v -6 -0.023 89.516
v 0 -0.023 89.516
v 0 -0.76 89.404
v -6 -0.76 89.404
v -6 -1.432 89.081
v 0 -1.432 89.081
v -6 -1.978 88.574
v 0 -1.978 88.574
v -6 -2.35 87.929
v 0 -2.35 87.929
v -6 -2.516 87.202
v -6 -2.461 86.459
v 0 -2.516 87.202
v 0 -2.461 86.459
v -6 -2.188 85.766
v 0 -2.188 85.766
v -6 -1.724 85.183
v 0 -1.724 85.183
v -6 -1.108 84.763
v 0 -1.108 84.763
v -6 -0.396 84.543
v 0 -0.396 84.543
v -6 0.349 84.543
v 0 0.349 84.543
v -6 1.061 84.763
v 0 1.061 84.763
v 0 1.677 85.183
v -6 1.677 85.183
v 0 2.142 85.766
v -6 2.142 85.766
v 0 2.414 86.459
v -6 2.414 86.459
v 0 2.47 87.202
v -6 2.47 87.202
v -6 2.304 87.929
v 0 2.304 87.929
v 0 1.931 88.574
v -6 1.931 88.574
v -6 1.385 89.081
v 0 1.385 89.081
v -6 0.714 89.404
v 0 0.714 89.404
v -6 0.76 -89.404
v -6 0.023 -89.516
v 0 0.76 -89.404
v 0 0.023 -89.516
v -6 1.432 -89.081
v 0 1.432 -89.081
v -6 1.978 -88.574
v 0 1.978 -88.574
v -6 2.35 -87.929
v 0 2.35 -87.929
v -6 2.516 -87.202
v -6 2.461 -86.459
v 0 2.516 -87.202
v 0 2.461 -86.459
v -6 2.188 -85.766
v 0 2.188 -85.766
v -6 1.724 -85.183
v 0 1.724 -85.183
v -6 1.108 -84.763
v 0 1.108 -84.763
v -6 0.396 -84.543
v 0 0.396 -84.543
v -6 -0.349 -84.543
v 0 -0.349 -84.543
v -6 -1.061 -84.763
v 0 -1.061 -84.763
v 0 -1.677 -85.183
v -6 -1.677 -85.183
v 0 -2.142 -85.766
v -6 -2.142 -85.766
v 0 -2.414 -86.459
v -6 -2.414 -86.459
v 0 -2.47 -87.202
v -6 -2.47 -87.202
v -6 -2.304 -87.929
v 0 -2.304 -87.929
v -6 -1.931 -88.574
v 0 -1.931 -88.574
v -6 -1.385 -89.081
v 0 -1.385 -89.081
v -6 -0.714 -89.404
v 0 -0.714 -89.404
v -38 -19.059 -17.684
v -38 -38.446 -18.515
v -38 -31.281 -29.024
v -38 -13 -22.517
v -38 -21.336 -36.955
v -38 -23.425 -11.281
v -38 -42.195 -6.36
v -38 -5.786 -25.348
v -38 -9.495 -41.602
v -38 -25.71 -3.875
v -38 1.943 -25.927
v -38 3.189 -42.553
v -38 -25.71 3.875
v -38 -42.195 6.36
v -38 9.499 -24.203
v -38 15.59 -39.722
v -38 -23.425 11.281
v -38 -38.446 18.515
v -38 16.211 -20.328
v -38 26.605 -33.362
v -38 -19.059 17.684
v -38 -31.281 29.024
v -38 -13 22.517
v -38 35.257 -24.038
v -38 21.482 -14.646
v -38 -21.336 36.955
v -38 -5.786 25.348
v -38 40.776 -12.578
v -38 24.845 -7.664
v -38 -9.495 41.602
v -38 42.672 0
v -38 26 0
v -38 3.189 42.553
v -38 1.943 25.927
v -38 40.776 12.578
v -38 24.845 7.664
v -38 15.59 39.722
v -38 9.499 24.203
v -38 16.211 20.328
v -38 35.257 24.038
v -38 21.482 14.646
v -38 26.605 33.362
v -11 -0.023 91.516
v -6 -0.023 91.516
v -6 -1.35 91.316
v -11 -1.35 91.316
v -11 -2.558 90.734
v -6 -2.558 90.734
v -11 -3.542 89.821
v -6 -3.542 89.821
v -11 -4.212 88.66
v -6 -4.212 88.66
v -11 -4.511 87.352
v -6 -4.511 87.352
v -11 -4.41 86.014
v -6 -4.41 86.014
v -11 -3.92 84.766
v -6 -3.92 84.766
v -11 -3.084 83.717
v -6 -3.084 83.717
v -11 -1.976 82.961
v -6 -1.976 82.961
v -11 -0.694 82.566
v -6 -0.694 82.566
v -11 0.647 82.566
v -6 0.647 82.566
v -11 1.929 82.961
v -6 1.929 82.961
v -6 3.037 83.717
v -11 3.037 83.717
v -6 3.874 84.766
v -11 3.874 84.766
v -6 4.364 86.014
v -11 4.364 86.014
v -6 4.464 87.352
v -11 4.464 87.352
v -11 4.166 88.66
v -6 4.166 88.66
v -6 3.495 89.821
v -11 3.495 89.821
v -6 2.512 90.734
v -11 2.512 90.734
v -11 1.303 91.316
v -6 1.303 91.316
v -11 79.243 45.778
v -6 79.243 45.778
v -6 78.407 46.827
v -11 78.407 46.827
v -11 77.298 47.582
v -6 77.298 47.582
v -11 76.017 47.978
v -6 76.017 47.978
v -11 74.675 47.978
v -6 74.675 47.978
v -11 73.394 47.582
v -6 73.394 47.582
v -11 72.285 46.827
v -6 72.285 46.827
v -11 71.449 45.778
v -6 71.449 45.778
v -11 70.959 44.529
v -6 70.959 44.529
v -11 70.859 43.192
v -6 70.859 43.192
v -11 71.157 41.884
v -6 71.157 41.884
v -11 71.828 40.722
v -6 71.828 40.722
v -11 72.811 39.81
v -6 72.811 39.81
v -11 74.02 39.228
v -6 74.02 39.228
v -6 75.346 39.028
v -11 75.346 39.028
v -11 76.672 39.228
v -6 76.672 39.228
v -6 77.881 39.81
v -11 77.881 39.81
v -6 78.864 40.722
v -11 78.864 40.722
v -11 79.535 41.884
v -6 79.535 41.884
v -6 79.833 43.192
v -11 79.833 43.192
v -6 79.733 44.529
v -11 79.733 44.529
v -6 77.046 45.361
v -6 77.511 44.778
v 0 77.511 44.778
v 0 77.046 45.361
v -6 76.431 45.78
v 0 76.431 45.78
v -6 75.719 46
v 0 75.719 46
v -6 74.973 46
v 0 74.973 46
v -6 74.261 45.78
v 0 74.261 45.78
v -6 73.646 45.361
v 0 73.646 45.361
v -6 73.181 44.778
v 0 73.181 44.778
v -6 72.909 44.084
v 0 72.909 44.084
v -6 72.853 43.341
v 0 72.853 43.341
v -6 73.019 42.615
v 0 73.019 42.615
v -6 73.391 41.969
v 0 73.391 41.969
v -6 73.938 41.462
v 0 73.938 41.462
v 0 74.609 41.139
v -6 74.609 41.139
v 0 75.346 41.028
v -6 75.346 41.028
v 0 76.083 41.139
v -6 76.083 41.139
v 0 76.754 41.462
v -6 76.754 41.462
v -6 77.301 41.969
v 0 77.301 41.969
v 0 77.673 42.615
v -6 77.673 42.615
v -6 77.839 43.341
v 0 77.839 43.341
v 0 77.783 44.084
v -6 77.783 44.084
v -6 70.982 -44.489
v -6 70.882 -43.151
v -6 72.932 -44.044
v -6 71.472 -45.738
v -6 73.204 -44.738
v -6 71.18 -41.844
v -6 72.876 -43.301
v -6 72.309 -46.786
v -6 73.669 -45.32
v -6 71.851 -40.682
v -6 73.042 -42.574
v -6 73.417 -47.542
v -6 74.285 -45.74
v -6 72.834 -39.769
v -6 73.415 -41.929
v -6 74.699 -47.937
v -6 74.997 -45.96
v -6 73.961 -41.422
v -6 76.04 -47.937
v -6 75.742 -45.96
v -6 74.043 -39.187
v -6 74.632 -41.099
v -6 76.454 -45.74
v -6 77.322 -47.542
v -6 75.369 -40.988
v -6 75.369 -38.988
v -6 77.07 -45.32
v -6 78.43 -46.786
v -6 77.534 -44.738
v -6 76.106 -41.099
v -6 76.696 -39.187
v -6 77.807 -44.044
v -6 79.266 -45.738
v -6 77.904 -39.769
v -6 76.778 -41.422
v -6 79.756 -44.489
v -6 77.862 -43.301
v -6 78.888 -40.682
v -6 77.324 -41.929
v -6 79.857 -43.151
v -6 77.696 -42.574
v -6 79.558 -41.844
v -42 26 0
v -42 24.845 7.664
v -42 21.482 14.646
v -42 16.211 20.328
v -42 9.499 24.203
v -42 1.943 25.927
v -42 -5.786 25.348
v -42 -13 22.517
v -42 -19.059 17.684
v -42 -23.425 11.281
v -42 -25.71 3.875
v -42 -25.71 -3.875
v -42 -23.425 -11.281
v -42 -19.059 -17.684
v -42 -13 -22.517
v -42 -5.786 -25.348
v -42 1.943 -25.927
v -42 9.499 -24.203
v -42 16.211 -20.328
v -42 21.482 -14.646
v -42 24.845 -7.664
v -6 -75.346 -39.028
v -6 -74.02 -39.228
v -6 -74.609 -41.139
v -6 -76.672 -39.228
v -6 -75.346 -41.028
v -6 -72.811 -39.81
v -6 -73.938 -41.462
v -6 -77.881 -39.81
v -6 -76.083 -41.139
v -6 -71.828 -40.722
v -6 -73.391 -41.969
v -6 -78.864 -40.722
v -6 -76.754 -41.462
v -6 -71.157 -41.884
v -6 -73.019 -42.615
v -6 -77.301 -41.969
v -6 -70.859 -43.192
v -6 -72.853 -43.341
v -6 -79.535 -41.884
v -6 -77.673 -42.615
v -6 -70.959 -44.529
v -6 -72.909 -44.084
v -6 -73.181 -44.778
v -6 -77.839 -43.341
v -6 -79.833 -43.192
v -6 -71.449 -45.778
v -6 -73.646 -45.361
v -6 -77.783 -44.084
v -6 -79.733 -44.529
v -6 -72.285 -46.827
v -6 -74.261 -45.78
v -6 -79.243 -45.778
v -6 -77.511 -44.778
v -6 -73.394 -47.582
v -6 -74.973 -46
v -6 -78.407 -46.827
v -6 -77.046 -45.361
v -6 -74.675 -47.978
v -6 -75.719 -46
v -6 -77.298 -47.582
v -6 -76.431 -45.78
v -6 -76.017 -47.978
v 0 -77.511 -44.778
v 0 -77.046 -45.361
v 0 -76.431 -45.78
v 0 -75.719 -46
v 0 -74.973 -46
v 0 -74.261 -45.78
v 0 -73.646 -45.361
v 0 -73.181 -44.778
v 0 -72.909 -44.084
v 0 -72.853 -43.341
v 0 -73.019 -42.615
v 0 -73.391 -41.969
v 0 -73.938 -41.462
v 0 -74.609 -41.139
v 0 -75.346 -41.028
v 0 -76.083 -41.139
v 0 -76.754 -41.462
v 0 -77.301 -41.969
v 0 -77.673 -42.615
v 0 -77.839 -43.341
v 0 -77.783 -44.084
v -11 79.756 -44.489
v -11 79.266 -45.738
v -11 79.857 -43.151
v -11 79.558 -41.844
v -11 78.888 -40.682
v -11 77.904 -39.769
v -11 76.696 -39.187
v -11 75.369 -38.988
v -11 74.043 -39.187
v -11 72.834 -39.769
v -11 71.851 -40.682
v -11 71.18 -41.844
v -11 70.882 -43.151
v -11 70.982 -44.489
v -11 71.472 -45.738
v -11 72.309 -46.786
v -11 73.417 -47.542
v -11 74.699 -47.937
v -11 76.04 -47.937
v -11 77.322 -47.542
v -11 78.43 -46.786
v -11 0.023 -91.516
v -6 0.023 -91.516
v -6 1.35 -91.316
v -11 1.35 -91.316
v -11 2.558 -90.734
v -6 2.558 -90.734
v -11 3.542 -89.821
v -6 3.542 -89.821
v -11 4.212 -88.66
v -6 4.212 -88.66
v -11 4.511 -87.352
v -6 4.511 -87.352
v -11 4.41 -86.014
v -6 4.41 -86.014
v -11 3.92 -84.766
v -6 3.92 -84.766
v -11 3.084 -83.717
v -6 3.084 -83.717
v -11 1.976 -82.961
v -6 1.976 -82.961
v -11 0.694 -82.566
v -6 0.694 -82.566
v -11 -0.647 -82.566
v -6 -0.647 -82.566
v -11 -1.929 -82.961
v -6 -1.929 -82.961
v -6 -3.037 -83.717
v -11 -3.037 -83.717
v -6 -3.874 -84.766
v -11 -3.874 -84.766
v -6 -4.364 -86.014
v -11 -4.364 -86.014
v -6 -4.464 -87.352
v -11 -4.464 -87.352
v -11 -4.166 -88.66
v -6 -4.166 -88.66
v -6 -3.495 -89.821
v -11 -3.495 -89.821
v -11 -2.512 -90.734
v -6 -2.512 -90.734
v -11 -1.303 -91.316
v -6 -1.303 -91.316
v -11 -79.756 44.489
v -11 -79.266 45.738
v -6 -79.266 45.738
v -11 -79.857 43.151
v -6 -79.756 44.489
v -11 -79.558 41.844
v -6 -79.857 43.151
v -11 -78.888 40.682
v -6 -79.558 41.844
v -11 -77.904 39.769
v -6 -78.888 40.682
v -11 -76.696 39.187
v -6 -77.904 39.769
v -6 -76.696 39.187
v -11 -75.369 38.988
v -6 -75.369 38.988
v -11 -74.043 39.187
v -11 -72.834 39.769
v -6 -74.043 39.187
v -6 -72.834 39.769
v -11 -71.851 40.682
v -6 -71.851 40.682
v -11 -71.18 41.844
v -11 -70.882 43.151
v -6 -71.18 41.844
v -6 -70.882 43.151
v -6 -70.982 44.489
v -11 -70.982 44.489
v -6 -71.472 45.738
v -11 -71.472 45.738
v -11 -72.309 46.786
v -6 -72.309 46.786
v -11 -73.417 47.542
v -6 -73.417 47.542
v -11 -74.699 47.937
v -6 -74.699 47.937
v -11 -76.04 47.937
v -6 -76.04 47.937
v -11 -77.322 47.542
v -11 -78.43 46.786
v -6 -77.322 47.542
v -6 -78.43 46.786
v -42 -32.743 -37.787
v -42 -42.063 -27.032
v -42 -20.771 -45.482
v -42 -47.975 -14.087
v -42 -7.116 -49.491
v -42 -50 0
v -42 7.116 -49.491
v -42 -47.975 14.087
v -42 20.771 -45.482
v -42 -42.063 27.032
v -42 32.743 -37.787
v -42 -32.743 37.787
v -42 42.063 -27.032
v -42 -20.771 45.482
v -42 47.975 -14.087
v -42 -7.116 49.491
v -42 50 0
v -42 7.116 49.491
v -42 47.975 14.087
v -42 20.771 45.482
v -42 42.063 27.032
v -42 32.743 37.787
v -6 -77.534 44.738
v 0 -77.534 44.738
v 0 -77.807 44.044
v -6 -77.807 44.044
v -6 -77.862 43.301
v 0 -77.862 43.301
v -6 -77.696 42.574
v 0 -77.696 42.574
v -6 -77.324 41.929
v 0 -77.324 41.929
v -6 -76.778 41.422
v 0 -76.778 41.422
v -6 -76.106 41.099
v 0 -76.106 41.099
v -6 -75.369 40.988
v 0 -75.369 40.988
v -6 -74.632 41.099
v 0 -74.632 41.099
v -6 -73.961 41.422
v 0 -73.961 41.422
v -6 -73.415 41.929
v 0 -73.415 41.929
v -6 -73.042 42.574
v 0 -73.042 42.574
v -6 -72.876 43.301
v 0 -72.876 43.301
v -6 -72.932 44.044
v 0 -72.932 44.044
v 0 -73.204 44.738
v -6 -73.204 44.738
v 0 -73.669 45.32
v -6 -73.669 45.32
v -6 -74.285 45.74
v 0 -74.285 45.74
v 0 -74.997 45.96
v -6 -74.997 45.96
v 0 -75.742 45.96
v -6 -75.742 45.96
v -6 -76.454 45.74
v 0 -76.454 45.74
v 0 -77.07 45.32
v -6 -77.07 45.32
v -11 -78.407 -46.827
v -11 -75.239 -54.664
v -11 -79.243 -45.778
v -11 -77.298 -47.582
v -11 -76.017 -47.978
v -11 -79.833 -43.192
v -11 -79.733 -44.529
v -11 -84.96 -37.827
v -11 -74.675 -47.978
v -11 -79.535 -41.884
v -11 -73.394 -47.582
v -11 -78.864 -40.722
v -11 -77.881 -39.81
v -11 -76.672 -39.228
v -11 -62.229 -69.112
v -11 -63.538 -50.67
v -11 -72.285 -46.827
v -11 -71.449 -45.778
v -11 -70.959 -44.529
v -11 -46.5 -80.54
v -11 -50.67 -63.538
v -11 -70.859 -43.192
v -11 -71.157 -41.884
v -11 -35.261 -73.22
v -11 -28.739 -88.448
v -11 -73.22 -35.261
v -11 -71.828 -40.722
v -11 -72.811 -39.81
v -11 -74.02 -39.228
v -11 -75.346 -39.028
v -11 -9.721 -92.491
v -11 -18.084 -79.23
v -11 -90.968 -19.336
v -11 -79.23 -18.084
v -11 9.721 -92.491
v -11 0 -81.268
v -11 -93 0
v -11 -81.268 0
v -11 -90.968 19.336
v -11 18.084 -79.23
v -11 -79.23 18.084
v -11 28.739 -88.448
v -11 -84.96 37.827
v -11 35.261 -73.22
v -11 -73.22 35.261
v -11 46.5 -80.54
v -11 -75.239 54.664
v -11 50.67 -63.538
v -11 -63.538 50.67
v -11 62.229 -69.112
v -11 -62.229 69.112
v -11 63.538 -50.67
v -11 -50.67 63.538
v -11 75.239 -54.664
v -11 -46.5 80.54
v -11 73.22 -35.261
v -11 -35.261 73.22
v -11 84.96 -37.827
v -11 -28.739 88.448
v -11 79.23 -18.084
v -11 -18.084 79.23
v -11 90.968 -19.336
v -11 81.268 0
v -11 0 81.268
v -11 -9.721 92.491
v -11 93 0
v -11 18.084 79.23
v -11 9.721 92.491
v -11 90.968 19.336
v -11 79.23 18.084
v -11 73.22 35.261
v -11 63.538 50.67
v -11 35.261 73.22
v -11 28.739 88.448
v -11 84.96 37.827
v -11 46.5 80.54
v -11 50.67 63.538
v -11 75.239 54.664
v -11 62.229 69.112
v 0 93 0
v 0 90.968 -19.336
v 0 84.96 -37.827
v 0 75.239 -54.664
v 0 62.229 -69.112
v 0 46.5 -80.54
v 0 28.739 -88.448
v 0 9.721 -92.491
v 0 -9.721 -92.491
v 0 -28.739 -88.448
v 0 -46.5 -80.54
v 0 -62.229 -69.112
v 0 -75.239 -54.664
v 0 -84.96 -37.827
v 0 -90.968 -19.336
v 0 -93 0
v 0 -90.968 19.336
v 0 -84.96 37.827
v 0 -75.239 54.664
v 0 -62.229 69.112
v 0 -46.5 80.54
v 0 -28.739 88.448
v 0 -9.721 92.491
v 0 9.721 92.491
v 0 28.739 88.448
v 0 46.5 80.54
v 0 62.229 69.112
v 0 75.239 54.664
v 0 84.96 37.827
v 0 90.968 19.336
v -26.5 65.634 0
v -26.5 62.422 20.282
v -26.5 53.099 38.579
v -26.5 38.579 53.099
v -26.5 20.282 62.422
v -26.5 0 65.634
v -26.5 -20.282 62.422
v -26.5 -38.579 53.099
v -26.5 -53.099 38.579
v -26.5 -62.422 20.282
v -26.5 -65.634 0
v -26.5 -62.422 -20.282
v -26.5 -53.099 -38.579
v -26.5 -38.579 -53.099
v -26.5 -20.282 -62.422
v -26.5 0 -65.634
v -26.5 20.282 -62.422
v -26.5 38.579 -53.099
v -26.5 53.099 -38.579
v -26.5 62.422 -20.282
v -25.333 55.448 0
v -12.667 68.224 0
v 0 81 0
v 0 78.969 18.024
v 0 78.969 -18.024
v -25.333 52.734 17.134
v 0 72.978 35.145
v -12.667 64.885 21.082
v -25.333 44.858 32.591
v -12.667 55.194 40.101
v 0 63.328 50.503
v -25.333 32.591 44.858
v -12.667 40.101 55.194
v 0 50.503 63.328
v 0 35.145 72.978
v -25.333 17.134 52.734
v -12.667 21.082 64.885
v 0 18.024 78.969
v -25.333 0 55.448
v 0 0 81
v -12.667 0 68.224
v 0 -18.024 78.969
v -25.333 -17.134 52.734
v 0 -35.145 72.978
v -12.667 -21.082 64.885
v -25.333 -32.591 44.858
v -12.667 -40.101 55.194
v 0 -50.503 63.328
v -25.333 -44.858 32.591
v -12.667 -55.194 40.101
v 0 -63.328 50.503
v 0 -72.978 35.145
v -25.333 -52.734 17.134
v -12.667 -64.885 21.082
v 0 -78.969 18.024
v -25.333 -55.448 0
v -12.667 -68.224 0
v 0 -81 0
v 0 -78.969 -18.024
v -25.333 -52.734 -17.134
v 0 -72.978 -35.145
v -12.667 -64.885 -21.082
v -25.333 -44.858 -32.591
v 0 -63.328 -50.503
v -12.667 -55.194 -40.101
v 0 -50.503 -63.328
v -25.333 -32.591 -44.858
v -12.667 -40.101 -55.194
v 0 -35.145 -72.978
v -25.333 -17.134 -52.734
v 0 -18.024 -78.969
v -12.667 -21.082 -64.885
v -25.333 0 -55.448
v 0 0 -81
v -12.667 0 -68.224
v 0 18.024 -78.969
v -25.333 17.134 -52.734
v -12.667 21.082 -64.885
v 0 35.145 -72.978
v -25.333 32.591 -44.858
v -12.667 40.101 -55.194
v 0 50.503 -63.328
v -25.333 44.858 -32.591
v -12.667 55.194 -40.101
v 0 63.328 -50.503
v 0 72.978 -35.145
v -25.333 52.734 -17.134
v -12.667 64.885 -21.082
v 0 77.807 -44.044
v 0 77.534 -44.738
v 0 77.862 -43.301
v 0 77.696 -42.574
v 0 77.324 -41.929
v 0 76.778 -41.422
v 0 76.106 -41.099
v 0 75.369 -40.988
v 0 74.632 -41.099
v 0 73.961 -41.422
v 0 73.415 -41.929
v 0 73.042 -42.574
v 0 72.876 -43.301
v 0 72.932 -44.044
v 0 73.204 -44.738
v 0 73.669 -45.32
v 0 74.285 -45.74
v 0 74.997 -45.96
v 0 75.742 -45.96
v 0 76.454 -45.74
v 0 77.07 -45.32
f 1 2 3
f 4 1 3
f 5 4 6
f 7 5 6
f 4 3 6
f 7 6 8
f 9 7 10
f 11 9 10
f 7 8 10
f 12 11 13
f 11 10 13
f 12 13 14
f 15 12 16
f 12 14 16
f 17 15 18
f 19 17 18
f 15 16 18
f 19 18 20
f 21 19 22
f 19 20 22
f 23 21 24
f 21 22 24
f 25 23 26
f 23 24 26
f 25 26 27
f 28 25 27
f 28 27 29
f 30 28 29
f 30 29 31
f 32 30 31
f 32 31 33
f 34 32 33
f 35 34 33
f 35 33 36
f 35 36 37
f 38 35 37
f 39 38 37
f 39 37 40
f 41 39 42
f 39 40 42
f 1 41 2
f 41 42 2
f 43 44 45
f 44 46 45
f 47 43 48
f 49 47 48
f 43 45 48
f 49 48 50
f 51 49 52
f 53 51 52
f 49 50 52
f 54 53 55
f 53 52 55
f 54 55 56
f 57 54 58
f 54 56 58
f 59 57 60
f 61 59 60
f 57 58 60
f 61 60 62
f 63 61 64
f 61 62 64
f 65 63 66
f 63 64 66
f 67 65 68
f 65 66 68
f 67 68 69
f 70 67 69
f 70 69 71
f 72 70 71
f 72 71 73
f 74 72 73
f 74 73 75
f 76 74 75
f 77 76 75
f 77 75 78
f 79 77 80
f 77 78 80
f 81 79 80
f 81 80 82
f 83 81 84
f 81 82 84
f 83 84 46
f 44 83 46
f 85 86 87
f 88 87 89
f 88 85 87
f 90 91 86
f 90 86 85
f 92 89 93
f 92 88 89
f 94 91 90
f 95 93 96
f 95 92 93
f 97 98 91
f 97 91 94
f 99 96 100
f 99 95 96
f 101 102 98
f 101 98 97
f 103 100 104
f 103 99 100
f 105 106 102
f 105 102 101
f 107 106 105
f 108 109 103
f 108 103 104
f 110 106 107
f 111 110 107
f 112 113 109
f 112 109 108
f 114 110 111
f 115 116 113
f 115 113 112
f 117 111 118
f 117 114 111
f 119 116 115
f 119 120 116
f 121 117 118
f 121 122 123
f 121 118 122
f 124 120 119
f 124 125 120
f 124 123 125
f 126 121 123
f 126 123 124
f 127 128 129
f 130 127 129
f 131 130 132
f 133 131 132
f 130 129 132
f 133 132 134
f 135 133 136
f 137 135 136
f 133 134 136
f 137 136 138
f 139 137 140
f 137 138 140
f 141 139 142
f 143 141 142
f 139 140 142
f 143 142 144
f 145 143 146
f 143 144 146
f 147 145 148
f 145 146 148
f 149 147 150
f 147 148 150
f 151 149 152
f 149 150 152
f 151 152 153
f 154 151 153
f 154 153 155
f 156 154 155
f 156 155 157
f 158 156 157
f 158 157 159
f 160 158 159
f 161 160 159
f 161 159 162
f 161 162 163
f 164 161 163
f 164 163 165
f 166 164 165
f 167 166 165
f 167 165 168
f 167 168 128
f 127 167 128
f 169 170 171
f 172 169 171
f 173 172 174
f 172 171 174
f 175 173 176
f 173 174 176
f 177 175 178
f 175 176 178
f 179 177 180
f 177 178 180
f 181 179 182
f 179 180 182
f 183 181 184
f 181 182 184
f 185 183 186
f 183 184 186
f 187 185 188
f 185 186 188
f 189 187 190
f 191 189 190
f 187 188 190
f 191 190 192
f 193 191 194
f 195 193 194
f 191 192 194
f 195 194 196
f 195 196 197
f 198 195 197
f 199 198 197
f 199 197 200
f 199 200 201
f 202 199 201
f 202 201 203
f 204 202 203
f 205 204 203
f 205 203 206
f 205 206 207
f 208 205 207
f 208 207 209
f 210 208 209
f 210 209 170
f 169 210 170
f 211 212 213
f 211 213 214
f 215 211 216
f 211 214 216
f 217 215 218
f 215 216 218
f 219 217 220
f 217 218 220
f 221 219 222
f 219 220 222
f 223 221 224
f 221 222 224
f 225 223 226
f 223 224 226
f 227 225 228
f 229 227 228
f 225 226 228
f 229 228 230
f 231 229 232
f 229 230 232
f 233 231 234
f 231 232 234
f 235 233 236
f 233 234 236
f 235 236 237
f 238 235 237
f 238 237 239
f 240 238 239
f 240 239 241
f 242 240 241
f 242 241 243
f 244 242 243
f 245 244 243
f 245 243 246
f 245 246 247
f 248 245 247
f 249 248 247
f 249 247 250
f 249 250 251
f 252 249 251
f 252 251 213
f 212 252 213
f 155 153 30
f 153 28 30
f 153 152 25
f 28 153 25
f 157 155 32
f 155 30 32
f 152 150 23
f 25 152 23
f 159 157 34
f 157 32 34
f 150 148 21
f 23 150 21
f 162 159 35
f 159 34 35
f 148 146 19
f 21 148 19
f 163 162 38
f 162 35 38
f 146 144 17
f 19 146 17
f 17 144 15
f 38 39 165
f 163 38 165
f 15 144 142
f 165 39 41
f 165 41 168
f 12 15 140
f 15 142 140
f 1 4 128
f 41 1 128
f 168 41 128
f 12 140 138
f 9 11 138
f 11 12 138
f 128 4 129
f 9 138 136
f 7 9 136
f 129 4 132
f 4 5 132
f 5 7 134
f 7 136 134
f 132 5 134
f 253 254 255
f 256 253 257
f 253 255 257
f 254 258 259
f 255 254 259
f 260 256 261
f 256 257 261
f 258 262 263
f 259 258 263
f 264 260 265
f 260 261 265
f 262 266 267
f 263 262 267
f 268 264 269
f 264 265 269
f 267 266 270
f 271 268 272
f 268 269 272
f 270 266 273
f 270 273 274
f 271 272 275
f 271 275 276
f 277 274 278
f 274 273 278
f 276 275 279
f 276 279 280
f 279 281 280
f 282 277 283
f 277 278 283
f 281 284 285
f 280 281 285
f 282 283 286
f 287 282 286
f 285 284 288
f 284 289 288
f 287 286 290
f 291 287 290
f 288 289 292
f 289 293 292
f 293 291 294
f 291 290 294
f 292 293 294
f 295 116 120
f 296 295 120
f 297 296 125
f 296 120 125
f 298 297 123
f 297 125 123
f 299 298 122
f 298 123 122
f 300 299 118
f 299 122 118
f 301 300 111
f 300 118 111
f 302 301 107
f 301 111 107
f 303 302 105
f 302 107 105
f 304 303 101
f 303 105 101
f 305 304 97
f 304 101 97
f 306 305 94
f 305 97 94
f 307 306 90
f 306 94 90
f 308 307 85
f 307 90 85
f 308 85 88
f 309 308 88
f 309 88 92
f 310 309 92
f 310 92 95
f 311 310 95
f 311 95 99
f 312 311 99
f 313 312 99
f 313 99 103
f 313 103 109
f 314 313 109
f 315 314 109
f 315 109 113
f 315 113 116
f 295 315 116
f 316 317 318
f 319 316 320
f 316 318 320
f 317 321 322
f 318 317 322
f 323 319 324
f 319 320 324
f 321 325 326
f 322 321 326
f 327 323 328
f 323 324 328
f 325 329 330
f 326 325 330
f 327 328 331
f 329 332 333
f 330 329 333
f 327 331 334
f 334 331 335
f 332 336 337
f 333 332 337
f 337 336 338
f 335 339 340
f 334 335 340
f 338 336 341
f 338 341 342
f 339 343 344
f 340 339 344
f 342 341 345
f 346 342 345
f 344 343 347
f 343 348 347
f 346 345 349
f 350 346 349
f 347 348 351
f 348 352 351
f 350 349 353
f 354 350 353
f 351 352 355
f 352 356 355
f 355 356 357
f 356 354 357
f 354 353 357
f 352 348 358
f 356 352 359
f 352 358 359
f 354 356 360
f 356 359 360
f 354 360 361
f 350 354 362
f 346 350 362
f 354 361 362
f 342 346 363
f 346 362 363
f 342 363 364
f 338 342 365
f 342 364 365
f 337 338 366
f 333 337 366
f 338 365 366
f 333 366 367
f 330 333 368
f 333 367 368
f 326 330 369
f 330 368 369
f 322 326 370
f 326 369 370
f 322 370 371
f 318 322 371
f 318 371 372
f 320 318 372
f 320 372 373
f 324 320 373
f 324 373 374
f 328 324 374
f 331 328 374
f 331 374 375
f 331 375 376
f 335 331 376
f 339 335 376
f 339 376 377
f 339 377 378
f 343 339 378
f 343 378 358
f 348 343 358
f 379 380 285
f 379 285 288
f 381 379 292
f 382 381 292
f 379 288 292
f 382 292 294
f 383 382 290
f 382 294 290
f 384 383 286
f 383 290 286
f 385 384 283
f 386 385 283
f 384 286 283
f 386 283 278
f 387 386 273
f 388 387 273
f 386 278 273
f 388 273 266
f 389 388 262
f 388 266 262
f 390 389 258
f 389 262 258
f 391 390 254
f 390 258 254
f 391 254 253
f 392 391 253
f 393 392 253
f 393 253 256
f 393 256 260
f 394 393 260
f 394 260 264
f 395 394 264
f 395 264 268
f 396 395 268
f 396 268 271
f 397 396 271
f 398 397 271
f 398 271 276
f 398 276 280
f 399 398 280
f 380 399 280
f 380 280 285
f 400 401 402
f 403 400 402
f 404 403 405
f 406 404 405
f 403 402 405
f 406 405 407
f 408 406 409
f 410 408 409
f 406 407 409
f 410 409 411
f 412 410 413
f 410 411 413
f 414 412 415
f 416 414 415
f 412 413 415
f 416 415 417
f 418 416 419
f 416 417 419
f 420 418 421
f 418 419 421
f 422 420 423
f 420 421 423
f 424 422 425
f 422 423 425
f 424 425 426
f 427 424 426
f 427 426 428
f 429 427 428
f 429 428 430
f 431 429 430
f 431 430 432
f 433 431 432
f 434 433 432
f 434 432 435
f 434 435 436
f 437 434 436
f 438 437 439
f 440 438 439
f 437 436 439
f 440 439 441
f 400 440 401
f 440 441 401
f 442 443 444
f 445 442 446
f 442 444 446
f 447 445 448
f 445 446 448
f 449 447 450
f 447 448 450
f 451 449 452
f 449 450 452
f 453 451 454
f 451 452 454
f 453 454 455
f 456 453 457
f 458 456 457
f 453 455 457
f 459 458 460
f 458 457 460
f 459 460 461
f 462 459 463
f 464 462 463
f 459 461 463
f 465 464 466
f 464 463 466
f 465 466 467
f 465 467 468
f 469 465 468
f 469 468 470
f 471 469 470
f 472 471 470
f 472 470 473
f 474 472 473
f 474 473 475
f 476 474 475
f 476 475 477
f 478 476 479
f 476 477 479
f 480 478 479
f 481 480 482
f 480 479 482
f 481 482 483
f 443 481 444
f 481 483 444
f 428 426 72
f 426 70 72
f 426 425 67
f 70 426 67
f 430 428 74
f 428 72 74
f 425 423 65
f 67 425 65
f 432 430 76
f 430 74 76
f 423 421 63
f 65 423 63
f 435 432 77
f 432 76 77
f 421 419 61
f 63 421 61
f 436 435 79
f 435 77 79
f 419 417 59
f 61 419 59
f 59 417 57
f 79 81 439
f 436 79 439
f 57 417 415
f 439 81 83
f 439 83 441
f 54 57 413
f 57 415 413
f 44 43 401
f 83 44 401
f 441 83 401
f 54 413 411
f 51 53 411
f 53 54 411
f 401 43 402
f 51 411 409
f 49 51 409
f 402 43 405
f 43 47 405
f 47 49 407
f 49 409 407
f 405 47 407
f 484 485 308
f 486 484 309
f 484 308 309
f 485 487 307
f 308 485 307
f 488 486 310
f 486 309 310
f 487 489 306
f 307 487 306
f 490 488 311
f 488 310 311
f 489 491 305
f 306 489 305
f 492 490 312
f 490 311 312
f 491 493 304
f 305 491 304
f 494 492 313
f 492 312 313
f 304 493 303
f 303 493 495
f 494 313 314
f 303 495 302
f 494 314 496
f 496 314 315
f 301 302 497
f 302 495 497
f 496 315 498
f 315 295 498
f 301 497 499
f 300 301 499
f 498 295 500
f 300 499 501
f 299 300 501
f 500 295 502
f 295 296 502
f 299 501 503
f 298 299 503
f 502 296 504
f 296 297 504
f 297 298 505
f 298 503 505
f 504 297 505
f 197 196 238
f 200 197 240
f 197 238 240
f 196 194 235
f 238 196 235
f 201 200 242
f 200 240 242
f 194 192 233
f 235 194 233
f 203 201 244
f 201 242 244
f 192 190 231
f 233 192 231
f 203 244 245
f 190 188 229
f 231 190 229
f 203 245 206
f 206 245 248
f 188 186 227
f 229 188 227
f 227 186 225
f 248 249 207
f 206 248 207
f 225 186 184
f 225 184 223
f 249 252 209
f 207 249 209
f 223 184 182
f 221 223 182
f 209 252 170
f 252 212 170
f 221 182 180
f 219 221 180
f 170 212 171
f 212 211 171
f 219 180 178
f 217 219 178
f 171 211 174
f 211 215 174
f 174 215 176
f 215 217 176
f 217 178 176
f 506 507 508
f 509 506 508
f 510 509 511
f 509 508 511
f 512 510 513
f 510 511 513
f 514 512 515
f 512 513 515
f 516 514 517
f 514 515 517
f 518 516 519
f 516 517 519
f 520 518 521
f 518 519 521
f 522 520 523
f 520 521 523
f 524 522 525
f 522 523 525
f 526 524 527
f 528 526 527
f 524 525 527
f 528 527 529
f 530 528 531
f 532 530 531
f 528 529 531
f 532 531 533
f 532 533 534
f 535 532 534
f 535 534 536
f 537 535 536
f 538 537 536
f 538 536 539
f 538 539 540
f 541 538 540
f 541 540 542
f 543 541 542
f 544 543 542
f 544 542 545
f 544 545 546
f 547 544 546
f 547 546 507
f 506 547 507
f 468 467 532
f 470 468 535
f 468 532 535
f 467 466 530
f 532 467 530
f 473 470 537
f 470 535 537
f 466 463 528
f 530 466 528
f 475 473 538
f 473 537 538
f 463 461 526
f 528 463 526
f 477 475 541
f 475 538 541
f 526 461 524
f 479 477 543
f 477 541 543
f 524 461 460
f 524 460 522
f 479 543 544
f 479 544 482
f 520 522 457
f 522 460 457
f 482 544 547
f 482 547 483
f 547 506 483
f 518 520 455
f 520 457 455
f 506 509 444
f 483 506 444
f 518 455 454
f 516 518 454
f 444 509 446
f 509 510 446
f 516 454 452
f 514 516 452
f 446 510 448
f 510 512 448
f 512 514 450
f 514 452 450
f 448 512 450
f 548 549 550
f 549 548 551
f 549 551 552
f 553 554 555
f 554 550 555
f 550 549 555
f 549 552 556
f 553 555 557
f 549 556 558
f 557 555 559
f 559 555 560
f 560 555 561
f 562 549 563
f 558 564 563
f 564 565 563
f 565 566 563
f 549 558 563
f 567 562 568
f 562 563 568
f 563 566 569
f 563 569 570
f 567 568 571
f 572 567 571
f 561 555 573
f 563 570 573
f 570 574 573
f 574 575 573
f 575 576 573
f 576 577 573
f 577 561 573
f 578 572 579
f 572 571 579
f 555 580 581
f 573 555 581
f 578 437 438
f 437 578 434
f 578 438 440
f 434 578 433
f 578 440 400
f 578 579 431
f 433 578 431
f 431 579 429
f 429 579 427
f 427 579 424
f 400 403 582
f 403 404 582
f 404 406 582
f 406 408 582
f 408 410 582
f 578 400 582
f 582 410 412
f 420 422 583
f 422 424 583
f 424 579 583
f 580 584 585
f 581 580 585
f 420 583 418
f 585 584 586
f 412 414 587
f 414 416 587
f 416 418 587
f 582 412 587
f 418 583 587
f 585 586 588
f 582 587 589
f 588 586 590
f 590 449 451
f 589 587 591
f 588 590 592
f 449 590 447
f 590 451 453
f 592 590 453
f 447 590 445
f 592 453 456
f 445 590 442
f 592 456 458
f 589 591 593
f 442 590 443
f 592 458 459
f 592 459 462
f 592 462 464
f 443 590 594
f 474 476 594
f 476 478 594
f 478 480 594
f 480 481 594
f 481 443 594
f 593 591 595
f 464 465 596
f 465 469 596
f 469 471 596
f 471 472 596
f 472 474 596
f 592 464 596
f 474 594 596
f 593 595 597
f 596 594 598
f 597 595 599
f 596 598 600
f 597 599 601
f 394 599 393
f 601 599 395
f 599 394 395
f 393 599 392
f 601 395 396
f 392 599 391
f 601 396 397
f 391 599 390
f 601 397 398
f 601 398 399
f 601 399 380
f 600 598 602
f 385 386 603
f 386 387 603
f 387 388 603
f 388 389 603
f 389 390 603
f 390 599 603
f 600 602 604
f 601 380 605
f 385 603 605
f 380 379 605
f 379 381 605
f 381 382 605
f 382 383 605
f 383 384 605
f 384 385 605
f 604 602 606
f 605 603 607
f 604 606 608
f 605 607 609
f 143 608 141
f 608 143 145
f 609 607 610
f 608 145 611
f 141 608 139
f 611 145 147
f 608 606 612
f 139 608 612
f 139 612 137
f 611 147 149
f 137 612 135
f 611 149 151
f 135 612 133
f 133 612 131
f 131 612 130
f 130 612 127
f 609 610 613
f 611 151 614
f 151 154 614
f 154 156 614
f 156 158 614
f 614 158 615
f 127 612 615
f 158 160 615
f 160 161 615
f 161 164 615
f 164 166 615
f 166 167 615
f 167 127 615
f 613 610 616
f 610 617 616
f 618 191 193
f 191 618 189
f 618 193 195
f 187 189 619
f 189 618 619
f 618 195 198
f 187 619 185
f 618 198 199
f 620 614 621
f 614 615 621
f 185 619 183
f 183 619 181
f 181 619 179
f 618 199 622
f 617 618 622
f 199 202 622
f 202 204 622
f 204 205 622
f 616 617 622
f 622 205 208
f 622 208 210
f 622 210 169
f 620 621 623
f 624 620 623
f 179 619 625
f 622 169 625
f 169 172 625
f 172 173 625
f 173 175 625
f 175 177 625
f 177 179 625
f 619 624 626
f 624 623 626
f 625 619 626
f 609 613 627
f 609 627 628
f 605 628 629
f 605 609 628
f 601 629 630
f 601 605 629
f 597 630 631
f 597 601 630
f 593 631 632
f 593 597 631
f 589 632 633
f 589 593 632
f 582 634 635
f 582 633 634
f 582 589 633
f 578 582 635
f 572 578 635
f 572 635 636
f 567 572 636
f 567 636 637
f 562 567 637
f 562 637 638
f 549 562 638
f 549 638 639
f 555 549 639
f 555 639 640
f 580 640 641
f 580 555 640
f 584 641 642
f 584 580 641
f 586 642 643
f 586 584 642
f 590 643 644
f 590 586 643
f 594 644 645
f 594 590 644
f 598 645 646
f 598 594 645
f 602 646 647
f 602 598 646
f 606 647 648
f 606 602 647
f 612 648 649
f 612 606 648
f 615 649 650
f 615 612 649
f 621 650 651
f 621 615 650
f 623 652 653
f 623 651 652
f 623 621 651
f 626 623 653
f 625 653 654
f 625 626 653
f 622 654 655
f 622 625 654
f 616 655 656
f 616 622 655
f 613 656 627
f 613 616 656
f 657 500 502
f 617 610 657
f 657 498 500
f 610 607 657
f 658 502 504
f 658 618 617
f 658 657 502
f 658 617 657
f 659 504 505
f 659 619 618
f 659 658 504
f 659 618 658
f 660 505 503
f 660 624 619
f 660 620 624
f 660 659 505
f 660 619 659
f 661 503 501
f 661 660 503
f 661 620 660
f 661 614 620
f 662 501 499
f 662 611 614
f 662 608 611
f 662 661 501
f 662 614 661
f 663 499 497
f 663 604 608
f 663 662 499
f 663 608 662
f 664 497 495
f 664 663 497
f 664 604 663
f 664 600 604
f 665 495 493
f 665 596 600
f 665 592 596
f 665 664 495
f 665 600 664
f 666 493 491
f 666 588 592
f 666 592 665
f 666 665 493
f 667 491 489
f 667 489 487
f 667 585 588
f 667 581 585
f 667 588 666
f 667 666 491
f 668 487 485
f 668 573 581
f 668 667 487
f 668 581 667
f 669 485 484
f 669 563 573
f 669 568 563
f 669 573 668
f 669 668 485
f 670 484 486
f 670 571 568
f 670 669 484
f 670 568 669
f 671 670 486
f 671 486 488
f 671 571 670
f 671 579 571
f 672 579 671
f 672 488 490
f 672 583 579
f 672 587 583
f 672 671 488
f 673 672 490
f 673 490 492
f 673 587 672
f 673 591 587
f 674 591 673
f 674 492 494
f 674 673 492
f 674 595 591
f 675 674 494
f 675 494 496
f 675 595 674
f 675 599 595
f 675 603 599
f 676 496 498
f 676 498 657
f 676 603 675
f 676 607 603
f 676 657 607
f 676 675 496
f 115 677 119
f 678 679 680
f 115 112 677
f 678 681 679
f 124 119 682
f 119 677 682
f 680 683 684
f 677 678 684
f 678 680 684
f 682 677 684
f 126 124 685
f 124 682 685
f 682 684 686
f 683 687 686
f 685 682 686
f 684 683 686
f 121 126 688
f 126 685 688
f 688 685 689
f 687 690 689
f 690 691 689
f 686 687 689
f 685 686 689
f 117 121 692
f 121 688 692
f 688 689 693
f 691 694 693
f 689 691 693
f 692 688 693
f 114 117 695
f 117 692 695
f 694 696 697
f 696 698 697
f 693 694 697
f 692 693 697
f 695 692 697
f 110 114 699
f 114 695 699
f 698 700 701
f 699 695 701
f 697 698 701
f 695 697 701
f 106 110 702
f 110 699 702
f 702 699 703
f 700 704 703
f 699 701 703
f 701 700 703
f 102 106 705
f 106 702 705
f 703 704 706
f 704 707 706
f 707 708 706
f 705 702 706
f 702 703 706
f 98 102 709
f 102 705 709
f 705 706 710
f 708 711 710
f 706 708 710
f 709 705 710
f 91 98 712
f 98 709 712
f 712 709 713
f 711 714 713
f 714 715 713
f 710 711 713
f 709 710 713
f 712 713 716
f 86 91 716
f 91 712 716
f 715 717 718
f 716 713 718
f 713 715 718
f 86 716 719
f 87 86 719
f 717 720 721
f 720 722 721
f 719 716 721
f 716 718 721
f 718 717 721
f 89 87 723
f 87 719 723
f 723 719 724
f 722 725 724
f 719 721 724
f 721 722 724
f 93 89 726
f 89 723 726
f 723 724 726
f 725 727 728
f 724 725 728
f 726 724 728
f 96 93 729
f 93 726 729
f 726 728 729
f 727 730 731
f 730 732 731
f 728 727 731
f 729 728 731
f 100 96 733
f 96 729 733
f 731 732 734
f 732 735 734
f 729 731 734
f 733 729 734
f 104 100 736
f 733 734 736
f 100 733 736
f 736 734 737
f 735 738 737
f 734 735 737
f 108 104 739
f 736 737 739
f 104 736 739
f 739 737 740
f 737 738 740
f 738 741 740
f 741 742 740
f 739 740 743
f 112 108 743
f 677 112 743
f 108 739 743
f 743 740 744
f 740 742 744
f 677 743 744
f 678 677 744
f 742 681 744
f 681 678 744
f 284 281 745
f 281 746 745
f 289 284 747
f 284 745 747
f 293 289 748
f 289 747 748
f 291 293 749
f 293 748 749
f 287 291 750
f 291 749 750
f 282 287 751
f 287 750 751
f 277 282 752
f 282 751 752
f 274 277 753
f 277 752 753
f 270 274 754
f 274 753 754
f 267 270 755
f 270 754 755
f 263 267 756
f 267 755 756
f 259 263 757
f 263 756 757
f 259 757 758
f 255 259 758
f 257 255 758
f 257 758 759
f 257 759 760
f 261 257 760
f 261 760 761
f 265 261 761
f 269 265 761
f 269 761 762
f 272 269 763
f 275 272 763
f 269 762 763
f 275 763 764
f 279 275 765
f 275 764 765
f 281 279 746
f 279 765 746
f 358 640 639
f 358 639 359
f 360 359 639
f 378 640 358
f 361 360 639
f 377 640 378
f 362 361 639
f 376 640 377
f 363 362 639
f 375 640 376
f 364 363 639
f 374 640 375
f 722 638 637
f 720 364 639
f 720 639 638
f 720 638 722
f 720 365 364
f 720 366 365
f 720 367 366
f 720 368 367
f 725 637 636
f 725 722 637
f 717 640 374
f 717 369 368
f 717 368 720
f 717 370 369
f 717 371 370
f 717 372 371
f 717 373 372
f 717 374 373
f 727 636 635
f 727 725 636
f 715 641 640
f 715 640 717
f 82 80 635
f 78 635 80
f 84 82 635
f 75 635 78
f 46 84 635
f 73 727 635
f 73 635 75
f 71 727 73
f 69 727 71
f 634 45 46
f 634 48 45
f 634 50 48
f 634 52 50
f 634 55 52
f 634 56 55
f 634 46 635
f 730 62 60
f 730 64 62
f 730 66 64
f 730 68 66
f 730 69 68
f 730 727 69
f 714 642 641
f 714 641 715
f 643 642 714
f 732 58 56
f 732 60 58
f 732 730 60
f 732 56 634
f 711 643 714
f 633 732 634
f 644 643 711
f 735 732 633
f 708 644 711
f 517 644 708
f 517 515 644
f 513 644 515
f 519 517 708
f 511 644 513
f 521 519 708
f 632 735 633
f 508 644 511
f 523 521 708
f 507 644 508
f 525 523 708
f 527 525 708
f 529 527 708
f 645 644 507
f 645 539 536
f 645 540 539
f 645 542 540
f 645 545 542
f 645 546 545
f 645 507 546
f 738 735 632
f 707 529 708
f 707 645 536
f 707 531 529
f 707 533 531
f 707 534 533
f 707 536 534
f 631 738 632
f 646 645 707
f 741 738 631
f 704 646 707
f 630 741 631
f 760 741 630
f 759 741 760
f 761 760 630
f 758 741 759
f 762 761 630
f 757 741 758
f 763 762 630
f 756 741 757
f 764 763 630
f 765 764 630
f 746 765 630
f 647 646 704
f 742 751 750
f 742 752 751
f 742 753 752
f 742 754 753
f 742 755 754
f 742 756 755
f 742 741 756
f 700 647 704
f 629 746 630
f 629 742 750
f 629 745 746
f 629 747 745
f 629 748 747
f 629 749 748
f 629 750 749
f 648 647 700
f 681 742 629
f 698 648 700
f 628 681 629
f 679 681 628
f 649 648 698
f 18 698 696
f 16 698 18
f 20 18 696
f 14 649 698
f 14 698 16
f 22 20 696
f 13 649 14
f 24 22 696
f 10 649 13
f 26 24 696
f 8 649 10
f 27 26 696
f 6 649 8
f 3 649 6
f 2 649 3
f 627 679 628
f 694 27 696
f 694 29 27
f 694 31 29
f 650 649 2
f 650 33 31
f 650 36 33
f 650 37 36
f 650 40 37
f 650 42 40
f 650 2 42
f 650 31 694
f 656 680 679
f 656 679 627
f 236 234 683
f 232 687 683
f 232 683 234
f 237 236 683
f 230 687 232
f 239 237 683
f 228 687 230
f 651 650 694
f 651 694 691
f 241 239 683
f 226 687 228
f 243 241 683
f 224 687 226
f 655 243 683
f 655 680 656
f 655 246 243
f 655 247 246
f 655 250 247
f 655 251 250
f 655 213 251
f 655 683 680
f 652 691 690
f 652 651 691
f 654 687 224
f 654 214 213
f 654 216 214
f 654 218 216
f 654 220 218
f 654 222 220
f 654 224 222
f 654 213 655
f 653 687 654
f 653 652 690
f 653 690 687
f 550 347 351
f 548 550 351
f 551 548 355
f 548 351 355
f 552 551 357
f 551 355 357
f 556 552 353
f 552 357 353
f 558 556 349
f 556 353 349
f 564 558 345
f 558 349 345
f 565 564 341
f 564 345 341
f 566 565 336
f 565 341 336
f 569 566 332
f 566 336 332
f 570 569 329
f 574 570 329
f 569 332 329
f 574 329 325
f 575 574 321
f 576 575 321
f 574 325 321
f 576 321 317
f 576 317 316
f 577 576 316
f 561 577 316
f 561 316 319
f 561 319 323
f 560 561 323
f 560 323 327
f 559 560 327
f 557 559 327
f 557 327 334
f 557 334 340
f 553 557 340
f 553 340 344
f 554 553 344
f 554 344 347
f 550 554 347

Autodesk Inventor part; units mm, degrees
ref_plane "YZ Plane" through (0, 0, 0) normal (1, 0, 0) x (0, 1, 0)
ref_plane "XZ Plane" through (0, 0, 0) normal (0, 1, 0) x (-1, 0, 0)
ref_plane "XY Plane" through (0, 0, 0) normal (0, 0, 1) x (1, 0, 0)
sketch "Эскиз1" plane through (0, 0, 0) normal (0, 0, 1) x (1, 0, 0)
  line L0 (0, 81) -> (0, 93)
  line L1 (0, 93) -> (-11, 93)
  line L2 (-11, 93) -> (-11, 81.2677)
  line L3 (-11, 81.2677) -> (-42, 50)
  line L4 (-42, 50) -> (-42, 26)
  line L5 (-42, 26) -> (-38, 26)
  line L6 (-38, 26) -> (-38, 42.6719)
  line L7 (-38, 42.6719) -> (0, 81)
  line L8 (0, 0) -> (0, 108.7974) construction
  line L9 (-50.4, 0) -> (8.4, 0) projected
  dimension "d0" = 11
  dimension "d1" = 12
  dimension "d2" = 24
  dimension "d3" = 4
  dimension "d4" = 8
  dimension "d5" = 67
  dimension "d6" = 42
  dimension "d7" = 93
revolve "Вращение1" add sketch "Эскиз1" angle 360 about axis through (-10, 0, 0) along (1, 0, 0)
hole "Отверстие1" at (-11, -0.0233, 87.0155) direction (1, 0, 0) diameter 5 end through all counterbore diameter 9 counterbore depth 5
pattern_circular "Круговой массив1" count 6 over 360 about axis through (-10, 0, 0) along (1, 0, 0) of "Отверстие1"
